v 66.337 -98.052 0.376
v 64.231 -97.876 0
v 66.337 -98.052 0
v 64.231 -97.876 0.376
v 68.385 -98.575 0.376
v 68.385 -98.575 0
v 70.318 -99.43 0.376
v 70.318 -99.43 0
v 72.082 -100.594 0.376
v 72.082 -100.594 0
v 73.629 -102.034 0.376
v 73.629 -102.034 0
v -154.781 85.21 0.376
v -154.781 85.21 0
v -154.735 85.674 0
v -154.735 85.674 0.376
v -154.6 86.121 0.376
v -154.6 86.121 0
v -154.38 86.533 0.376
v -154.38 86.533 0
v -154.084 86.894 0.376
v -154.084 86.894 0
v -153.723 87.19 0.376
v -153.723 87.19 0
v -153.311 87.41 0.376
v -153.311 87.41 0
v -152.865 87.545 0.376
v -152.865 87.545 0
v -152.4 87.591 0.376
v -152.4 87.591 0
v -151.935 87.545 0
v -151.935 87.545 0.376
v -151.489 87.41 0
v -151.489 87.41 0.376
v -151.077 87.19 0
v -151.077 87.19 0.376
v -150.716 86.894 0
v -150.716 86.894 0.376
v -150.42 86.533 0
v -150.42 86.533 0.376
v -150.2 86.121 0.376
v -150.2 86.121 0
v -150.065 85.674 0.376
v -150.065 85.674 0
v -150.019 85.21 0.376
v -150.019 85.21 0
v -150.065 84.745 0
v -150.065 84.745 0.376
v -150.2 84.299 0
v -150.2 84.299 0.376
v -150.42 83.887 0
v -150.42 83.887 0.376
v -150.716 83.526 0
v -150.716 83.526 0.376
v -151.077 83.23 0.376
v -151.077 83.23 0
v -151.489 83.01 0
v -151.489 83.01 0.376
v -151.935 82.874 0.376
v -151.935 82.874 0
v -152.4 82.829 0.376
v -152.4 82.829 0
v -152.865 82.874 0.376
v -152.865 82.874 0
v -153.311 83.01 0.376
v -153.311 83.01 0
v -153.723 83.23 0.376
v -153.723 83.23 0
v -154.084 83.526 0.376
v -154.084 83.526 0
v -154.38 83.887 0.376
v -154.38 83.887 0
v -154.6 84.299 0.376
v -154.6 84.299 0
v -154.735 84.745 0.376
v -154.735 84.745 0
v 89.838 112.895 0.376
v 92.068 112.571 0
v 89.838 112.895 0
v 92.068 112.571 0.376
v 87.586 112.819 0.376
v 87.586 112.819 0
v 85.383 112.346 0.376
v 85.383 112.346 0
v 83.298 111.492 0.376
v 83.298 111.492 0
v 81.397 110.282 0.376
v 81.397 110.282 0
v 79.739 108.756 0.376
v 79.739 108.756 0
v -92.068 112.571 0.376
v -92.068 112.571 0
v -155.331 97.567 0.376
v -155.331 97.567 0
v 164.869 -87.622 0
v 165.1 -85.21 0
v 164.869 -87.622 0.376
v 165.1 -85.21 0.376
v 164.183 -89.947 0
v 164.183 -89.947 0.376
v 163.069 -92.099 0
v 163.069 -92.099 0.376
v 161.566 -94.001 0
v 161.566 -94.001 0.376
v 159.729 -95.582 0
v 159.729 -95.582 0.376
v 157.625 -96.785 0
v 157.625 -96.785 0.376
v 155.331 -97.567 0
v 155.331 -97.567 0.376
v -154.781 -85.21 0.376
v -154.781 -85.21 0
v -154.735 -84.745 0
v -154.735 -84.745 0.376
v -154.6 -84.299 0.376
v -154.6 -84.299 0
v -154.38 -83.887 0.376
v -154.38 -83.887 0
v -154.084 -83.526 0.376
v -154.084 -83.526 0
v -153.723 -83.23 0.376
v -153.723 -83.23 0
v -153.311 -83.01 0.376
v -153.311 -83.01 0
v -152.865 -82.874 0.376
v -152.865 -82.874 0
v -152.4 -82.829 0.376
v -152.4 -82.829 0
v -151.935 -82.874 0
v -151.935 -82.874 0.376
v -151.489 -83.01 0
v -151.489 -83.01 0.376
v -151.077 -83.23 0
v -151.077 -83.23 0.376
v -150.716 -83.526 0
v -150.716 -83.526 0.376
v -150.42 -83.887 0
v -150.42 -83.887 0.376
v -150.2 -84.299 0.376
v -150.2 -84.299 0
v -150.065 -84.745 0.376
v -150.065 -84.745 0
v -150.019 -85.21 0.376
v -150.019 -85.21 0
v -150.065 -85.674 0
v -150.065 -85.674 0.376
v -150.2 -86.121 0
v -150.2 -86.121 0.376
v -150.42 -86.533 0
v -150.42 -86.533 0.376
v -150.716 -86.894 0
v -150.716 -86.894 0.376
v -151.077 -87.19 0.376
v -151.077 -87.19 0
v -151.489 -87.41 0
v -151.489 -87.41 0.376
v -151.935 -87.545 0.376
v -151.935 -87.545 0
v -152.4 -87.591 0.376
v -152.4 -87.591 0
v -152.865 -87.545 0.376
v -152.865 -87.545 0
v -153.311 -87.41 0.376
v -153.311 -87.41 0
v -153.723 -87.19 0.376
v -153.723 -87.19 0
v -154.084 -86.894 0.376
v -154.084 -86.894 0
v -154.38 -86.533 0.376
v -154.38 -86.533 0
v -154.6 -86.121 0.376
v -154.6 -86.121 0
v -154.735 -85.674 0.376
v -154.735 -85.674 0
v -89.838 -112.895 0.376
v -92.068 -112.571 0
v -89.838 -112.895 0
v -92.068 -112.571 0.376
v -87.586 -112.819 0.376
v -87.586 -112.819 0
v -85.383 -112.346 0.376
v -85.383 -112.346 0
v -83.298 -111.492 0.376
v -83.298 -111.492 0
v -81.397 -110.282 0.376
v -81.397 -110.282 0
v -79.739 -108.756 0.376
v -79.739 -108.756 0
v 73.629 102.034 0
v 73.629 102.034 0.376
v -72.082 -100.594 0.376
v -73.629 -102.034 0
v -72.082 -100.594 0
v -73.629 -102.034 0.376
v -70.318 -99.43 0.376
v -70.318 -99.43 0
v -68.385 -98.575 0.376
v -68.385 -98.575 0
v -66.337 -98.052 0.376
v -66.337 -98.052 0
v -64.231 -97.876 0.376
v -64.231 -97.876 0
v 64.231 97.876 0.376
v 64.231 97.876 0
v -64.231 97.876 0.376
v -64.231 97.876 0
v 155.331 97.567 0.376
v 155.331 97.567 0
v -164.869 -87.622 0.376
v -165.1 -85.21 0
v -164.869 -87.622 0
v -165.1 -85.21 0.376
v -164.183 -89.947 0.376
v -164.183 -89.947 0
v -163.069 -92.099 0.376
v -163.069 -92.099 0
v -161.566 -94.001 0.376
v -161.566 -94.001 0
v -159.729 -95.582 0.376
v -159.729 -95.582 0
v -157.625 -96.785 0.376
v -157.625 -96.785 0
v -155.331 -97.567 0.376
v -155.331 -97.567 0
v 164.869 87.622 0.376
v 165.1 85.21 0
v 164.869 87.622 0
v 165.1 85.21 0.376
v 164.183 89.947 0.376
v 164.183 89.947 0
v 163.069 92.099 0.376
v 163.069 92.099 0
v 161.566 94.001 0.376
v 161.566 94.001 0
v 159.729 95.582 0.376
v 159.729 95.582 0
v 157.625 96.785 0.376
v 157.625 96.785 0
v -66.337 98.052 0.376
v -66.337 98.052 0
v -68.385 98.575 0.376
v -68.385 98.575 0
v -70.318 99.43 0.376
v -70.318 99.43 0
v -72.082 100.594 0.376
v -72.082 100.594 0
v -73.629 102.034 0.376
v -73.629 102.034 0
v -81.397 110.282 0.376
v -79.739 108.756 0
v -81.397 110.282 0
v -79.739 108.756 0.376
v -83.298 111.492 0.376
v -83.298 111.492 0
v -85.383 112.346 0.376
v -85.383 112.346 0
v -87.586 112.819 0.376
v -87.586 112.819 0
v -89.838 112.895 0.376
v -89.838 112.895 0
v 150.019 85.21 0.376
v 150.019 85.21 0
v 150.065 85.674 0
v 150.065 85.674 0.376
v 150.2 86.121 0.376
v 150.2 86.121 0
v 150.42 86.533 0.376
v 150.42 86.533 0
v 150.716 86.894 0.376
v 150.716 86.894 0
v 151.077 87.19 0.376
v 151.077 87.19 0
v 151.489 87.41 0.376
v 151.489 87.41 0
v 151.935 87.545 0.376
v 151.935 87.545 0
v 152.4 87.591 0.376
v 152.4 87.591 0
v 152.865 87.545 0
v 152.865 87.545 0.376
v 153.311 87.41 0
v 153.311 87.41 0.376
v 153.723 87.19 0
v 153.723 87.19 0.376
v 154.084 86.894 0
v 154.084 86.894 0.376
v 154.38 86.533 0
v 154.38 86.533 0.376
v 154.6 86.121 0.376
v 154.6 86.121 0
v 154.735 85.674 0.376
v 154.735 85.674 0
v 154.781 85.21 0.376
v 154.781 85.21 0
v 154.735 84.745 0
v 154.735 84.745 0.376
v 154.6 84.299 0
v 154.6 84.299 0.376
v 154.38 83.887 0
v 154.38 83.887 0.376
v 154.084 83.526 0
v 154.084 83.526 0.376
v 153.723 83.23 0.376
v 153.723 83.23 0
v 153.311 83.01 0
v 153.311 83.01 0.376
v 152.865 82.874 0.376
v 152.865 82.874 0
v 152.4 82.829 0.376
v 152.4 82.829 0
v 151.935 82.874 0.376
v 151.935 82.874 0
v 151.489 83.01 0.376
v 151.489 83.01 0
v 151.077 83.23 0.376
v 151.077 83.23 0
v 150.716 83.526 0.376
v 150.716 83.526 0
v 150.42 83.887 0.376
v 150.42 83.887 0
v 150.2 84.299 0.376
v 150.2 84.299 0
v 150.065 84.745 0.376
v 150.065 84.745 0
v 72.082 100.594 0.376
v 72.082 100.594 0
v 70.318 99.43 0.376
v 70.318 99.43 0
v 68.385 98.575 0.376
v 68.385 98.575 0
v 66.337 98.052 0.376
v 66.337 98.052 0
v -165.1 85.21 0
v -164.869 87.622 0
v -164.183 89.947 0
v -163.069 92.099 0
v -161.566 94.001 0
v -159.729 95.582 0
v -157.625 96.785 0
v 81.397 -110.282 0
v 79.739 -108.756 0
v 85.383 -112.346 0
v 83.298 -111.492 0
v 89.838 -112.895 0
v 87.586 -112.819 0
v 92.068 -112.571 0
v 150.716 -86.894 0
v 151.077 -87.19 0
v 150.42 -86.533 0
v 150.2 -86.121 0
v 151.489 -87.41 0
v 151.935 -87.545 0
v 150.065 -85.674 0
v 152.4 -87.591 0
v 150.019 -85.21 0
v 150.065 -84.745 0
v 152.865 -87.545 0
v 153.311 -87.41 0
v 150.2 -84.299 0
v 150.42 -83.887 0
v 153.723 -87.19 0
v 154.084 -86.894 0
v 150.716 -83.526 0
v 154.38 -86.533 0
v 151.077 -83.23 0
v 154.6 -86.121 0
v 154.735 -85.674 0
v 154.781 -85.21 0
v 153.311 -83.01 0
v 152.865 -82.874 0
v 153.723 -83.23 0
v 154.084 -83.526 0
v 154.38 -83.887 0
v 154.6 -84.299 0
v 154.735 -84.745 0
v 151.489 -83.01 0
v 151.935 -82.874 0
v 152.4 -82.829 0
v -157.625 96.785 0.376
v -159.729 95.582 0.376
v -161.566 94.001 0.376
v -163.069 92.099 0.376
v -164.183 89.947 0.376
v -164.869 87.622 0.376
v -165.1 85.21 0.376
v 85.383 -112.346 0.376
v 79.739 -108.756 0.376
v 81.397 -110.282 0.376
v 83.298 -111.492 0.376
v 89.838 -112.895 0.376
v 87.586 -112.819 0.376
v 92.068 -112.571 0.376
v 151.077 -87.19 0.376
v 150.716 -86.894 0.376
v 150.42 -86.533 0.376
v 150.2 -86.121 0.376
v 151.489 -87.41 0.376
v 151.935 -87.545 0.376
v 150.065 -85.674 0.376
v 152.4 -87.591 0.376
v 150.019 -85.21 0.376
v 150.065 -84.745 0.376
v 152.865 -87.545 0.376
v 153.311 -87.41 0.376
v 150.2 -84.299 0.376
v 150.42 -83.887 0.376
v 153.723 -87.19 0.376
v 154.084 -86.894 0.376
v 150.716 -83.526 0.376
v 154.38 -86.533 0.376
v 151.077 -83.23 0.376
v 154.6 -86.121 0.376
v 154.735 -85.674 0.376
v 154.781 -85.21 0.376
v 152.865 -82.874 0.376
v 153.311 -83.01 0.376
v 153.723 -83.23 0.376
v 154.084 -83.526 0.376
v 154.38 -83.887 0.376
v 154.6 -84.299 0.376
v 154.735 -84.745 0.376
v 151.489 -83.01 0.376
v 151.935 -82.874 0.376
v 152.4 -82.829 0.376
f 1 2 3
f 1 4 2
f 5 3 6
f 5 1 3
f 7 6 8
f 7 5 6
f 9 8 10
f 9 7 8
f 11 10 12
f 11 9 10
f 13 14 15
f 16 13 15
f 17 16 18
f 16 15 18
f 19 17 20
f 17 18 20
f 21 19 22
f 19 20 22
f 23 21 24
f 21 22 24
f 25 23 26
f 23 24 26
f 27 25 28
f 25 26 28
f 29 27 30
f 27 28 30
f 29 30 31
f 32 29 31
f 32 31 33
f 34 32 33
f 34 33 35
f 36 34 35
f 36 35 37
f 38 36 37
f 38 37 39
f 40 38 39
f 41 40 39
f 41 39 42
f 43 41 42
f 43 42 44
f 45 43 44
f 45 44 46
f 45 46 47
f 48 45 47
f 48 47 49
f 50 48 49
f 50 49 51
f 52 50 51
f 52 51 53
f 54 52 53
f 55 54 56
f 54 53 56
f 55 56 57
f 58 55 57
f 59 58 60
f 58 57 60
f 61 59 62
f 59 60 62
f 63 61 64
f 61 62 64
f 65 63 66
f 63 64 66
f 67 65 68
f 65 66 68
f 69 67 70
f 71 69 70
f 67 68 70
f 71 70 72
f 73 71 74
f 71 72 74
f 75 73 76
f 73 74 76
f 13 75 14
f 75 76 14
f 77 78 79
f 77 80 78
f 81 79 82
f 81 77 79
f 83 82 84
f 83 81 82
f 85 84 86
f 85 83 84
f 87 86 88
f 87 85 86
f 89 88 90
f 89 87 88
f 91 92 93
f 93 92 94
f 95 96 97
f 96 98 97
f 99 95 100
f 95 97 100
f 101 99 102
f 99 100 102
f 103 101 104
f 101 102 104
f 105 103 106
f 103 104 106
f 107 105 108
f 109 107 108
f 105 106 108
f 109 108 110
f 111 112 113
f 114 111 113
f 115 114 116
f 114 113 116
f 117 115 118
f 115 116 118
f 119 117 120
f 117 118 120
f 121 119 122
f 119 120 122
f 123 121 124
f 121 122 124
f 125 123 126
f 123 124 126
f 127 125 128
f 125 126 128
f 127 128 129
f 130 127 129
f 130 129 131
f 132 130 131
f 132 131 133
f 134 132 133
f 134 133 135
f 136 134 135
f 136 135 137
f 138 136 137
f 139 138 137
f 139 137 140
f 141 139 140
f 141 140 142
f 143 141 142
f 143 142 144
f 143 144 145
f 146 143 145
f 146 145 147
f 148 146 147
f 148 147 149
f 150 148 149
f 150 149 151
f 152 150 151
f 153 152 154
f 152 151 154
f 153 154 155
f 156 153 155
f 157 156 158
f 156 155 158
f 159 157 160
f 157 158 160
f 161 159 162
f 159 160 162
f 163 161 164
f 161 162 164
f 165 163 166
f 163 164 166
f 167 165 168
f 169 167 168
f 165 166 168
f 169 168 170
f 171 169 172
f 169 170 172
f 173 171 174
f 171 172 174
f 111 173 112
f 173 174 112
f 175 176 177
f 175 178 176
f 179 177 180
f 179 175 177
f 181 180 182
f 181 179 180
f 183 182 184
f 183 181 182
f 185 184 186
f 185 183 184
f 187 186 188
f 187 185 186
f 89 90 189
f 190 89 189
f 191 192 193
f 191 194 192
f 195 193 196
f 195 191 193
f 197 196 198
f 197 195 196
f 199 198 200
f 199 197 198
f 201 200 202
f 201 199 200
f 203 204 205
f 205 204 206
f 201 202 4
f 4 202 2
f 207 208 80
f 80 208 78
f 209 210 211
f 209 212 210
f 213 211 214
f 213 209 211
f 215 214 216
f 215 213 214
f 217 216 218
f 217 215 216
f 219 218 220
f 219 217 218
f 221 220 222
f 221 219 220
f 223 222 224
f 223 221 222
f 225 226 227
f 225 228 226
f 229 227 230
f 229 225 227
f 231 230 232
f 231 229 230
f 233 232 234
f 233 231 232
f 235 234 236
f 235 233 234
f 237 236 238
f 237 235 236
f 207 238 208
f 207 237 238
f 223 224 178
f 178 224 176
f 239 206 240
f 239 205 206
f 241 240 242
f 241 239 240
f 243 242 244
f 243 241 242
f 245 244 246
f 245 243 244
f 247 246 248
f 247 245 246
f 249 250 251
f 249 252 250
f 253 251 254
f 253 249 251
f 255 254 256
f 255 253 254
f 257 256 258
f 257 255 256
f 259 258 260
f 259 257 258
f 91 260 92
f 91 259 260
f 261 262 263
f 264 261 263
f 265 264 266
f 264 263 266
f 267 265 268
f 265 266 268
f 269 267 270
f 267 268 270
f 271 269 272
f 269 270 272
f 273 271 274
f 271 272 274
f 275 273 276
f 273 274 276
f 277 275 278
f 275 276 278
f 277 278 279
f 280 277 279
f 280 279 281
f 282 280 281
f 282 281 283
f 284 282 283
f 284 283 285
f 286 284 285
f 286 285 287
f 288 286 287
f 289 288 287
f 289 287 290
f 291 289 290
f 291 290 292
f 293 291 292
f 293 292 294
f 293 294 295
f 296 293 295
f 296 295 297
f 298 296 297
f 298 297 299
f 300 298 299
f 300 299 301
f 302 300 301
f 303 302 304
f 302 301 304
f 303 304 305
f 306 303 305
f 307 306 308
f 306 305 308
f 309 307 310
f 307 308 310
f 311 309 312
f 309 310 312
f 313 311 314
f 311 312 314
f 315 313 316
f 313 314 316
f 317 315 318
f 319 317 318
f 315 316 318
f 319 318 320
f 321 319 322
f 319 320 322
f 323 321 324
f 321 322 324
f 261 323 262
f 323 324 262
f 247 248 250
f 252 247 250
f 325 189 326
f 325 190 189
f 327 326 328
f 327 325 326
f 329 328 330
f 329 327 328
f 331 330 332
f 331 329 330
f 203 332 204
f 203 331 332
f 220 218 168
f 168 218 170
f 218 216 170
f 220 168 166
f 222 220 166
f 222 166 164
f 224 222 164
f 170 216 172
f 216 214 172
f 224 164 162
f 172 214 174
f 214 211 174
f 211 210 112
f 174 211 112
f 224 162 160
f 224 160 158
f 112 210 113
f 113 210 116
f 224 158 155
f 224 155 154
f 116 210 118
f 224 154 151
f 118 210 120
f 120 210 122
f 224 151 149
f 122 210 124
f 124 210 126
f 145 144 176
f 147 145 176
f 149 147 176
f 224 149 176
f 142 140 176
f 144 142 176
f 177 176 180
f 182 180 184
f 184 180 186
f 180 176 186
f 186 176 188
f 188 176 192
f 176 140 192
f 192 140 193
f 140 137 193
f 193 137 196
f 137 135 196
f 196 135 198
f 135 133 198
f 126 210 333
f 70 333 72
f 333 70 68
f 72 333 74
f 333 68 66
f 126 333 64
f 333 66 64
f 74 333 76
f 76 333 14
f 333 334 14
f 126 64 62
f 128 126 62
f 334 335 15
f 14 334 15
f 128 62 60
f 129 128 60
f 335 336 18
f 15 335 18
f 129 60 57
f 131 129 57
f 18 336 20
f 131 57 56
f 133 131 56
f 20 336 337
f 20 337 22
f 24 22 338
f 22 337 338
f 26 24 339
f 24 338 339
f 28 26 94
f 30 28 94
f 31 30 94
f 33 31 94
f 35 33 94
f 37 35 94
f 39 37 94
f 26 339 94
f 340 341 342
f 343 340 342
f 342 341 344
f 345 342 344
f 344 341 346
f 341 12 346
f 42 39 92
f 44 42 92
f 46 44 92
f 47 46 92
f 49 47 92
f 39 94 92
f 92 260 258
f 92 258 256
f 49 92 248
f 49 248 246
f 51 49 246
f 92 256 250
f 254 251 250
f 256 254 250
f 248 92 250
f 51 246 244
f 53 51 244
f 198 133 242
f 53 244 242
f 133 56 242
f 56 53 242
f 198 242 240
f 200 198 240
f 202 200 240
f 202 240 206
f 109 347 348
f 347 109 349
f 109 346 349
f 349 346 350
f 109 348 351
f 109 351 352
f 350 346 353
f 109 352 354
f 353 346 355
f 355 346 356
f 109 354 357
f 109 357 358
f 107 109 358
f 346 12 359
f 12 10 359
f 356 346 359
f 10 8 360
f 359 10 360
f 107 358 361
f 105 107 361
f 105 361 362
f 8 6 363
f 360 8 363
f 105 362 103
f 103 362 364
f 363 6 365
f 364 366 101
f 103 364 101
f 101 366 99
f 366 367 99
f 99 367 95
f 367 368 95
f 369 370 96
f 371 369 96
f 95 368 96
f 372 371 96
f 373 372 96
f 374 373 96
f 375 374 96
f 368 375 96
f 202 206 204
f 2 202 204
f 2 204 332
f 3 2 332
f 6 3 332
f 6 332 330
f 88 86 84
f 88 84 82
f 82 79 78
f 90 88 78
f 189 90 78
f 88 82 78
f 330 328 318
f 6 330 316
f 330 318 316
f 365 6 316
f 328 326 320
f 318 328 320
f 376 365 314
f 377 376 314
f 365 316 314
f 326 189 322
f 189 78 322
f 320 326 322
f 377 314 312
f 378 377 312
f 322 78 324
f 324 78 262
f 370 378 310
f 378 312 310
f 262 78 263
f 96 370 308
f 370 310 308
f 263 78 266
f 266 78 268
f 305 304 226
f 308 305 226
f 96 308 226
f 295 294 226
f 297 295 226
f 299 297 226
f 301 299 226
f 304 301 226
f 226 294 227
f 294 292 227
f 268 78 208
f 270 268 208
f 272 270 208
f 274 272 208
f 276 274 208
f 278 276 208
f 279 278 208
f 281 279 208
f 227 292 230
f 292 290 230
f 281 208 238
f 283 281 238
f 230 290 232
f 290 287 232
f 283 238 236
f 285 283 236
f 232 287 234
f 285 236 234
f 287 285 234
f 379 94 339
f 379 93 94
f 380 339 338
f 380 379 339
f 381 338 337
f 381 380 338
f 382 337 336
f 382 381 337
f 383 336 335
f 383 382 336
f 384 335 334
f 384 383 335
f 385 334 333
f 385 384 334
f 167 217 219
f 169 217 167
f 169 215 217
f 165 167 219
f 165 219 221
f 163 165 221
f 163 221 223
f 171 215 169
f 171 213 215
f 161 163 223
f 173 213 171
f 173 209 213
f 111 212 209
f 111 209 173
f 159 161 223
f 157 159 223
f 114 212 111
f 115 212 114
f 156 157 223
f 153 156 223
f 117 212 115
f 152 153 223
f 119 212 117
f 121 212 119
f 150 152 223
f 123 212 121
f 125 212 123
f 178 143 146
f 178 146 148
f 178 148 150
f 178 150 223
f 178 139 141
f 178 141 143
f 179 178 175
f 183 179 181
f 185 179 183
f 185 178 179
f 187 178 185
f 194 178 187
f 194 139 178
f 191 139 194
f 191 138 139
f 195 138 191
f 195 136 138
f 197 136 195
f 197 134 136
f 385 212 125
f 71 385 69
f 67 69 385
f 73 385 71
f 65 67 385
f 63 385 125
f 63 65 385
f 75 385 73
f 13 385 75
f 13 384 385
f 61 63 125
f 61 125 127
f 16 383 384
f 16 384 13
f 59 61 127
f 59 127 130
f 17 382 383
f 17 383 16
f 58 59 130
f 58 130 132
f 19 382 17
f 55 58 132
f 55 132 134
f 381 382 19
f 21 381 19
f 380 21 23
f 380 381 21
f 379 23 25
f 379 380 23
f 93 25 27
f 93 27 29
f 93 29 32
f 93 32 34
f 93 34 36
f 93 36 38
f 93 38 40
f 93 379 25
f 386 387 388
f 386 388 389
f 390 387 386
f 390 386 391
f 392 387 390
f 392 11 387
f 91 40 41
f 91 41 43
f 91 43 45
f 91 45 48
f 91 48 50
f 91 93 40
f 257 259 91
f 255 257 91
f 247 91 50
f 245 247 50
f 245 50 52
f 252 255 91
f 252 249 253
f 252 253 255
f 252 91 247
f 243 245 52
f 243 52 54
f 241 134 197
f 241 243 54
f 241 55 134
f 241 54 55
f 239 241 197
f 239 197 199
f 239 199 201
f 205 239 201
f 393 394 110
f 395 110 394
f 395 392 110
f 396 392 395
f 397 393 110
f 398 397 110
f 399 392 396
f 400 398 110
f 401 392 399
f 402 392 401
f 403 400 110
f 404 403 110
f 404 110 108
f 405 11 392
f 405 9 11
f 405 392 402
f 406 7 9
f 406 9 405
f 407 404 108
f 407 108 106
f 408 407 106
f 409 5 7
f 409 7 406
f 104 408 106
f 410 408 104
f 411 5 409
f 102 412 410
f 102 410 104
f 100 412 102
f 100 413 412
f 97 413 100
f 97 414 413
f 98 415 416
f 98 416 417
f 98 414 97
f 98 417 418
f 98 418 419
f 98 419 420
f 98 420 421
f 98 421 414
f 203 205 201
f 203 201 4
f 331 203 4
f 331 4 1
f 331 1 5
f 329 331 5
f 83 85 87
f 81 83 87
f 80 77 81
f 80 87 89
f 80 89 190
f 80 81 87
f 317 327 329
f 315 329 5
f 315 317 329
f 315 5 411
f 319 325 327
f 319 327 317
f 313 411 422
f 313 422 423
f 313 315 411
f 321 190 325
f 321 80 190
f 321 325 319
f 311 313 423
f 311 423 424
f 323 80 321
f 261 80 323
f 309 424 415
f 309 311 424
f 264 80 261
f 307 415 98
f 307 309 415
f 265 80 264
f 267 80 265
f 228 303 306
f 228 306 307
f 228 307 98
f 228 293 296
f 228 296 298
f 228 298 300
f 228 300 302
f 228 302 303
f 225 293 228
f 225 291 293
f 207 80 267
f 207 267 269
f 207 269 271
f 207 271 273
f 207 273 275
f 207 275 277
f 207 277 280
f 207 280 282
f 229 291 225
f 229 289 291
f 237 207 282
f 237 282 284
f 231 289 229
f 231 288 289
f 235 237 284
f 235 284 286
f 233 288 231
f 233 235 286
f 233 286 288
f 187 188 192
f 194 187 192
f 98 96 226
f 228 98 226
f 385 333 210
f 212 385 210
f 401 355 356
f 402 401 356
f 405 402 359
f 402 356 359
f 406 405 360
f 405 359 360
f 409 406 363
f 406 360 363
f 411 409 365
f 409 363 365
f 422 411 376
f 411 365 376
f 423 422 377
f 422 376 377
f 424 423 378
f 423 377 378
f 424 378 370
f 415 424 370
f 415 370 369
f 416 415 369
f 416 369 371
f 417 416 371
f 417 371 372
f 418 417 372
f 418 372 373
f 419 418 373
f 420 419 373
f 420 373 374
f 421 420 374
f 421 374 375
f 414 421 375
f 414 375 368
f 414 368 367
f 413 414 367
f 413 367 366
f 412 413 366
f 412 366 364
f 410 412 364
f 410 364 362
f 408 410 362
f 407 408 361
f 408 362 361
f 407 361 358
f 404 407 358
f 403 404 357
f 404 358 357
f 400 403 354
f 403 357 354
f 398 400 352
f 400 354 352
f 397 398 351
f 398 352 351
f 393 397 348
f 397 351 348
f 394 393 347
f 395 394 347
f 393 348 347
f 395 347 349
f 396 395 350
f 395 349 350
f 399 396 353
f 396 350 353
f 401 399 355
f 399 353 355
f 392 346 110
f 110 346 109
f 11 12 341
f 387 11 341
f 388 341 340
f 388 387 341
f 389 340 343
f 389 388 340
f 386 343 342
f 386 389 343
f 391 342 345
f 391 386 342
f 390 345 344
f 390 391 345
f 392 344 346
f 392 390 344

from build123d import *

# Parameters (mm, degrees)
F1_DEPTH = 0.37592
F2_R     = 12.7
F4_D     = 4.7625
F4_DEPTH = 6.731


with BuildPart() as f1:
    # F0 (on Top) → F1 (new body)
    with BuildSketch(Plane.XY):
        Polygon((165.1, -95.25), (165.1, 95.25), (84.778147, 114.3), (69.85, 97.876274), (0, 97.876274), (-69.85, 97.876274), (-84.778147, 114.3), (-165.1, 95.25), (-165.1, -95.25), (-84.778147, -114.3), (-69.85, -97.876274), (0, -97.876274), (69.85, -97.876274), (84.778147, -114.3), align=None)
    extrude(amount=F1_DEPTH)

    # F2
    f2_edges = [f1.edges().sort_by_distance(p)[0] for p in [
        (-165.1, -95.25, 0.18796),
        (-84.778147, -114.3, 0.18796),
        (-69.85, -97.876274, 0.18796),
        (69.85, -97.876274, 0.18796),
        (84.778147, -114.3, 0.18796),
        (165.1, -95.25, 0.18796),
        (165.1, 95.25, 0.18796),
        (84.778147, 114.3, 0.18796),
        (69.85, 97.876274, 0.18796),
        (-69.85, 97.876274, 0.18796),
        (-84.778147, 114.3, 0.18796),
        (-165.1, 95.25, 0.18796),
    ]]
    fillet(f2_edges, radius=F2_R)

    # F4
    with Locations(Plane.XY.offset(0.37592)):
        with Locations((152.4, -85.209768), (-152.4, -85.209768), (-152.4, 85.209768), (152.4, 85.209768)):
            Hole(F4_D / 2, depth=F4_DEPTH)


solid = f1.part
